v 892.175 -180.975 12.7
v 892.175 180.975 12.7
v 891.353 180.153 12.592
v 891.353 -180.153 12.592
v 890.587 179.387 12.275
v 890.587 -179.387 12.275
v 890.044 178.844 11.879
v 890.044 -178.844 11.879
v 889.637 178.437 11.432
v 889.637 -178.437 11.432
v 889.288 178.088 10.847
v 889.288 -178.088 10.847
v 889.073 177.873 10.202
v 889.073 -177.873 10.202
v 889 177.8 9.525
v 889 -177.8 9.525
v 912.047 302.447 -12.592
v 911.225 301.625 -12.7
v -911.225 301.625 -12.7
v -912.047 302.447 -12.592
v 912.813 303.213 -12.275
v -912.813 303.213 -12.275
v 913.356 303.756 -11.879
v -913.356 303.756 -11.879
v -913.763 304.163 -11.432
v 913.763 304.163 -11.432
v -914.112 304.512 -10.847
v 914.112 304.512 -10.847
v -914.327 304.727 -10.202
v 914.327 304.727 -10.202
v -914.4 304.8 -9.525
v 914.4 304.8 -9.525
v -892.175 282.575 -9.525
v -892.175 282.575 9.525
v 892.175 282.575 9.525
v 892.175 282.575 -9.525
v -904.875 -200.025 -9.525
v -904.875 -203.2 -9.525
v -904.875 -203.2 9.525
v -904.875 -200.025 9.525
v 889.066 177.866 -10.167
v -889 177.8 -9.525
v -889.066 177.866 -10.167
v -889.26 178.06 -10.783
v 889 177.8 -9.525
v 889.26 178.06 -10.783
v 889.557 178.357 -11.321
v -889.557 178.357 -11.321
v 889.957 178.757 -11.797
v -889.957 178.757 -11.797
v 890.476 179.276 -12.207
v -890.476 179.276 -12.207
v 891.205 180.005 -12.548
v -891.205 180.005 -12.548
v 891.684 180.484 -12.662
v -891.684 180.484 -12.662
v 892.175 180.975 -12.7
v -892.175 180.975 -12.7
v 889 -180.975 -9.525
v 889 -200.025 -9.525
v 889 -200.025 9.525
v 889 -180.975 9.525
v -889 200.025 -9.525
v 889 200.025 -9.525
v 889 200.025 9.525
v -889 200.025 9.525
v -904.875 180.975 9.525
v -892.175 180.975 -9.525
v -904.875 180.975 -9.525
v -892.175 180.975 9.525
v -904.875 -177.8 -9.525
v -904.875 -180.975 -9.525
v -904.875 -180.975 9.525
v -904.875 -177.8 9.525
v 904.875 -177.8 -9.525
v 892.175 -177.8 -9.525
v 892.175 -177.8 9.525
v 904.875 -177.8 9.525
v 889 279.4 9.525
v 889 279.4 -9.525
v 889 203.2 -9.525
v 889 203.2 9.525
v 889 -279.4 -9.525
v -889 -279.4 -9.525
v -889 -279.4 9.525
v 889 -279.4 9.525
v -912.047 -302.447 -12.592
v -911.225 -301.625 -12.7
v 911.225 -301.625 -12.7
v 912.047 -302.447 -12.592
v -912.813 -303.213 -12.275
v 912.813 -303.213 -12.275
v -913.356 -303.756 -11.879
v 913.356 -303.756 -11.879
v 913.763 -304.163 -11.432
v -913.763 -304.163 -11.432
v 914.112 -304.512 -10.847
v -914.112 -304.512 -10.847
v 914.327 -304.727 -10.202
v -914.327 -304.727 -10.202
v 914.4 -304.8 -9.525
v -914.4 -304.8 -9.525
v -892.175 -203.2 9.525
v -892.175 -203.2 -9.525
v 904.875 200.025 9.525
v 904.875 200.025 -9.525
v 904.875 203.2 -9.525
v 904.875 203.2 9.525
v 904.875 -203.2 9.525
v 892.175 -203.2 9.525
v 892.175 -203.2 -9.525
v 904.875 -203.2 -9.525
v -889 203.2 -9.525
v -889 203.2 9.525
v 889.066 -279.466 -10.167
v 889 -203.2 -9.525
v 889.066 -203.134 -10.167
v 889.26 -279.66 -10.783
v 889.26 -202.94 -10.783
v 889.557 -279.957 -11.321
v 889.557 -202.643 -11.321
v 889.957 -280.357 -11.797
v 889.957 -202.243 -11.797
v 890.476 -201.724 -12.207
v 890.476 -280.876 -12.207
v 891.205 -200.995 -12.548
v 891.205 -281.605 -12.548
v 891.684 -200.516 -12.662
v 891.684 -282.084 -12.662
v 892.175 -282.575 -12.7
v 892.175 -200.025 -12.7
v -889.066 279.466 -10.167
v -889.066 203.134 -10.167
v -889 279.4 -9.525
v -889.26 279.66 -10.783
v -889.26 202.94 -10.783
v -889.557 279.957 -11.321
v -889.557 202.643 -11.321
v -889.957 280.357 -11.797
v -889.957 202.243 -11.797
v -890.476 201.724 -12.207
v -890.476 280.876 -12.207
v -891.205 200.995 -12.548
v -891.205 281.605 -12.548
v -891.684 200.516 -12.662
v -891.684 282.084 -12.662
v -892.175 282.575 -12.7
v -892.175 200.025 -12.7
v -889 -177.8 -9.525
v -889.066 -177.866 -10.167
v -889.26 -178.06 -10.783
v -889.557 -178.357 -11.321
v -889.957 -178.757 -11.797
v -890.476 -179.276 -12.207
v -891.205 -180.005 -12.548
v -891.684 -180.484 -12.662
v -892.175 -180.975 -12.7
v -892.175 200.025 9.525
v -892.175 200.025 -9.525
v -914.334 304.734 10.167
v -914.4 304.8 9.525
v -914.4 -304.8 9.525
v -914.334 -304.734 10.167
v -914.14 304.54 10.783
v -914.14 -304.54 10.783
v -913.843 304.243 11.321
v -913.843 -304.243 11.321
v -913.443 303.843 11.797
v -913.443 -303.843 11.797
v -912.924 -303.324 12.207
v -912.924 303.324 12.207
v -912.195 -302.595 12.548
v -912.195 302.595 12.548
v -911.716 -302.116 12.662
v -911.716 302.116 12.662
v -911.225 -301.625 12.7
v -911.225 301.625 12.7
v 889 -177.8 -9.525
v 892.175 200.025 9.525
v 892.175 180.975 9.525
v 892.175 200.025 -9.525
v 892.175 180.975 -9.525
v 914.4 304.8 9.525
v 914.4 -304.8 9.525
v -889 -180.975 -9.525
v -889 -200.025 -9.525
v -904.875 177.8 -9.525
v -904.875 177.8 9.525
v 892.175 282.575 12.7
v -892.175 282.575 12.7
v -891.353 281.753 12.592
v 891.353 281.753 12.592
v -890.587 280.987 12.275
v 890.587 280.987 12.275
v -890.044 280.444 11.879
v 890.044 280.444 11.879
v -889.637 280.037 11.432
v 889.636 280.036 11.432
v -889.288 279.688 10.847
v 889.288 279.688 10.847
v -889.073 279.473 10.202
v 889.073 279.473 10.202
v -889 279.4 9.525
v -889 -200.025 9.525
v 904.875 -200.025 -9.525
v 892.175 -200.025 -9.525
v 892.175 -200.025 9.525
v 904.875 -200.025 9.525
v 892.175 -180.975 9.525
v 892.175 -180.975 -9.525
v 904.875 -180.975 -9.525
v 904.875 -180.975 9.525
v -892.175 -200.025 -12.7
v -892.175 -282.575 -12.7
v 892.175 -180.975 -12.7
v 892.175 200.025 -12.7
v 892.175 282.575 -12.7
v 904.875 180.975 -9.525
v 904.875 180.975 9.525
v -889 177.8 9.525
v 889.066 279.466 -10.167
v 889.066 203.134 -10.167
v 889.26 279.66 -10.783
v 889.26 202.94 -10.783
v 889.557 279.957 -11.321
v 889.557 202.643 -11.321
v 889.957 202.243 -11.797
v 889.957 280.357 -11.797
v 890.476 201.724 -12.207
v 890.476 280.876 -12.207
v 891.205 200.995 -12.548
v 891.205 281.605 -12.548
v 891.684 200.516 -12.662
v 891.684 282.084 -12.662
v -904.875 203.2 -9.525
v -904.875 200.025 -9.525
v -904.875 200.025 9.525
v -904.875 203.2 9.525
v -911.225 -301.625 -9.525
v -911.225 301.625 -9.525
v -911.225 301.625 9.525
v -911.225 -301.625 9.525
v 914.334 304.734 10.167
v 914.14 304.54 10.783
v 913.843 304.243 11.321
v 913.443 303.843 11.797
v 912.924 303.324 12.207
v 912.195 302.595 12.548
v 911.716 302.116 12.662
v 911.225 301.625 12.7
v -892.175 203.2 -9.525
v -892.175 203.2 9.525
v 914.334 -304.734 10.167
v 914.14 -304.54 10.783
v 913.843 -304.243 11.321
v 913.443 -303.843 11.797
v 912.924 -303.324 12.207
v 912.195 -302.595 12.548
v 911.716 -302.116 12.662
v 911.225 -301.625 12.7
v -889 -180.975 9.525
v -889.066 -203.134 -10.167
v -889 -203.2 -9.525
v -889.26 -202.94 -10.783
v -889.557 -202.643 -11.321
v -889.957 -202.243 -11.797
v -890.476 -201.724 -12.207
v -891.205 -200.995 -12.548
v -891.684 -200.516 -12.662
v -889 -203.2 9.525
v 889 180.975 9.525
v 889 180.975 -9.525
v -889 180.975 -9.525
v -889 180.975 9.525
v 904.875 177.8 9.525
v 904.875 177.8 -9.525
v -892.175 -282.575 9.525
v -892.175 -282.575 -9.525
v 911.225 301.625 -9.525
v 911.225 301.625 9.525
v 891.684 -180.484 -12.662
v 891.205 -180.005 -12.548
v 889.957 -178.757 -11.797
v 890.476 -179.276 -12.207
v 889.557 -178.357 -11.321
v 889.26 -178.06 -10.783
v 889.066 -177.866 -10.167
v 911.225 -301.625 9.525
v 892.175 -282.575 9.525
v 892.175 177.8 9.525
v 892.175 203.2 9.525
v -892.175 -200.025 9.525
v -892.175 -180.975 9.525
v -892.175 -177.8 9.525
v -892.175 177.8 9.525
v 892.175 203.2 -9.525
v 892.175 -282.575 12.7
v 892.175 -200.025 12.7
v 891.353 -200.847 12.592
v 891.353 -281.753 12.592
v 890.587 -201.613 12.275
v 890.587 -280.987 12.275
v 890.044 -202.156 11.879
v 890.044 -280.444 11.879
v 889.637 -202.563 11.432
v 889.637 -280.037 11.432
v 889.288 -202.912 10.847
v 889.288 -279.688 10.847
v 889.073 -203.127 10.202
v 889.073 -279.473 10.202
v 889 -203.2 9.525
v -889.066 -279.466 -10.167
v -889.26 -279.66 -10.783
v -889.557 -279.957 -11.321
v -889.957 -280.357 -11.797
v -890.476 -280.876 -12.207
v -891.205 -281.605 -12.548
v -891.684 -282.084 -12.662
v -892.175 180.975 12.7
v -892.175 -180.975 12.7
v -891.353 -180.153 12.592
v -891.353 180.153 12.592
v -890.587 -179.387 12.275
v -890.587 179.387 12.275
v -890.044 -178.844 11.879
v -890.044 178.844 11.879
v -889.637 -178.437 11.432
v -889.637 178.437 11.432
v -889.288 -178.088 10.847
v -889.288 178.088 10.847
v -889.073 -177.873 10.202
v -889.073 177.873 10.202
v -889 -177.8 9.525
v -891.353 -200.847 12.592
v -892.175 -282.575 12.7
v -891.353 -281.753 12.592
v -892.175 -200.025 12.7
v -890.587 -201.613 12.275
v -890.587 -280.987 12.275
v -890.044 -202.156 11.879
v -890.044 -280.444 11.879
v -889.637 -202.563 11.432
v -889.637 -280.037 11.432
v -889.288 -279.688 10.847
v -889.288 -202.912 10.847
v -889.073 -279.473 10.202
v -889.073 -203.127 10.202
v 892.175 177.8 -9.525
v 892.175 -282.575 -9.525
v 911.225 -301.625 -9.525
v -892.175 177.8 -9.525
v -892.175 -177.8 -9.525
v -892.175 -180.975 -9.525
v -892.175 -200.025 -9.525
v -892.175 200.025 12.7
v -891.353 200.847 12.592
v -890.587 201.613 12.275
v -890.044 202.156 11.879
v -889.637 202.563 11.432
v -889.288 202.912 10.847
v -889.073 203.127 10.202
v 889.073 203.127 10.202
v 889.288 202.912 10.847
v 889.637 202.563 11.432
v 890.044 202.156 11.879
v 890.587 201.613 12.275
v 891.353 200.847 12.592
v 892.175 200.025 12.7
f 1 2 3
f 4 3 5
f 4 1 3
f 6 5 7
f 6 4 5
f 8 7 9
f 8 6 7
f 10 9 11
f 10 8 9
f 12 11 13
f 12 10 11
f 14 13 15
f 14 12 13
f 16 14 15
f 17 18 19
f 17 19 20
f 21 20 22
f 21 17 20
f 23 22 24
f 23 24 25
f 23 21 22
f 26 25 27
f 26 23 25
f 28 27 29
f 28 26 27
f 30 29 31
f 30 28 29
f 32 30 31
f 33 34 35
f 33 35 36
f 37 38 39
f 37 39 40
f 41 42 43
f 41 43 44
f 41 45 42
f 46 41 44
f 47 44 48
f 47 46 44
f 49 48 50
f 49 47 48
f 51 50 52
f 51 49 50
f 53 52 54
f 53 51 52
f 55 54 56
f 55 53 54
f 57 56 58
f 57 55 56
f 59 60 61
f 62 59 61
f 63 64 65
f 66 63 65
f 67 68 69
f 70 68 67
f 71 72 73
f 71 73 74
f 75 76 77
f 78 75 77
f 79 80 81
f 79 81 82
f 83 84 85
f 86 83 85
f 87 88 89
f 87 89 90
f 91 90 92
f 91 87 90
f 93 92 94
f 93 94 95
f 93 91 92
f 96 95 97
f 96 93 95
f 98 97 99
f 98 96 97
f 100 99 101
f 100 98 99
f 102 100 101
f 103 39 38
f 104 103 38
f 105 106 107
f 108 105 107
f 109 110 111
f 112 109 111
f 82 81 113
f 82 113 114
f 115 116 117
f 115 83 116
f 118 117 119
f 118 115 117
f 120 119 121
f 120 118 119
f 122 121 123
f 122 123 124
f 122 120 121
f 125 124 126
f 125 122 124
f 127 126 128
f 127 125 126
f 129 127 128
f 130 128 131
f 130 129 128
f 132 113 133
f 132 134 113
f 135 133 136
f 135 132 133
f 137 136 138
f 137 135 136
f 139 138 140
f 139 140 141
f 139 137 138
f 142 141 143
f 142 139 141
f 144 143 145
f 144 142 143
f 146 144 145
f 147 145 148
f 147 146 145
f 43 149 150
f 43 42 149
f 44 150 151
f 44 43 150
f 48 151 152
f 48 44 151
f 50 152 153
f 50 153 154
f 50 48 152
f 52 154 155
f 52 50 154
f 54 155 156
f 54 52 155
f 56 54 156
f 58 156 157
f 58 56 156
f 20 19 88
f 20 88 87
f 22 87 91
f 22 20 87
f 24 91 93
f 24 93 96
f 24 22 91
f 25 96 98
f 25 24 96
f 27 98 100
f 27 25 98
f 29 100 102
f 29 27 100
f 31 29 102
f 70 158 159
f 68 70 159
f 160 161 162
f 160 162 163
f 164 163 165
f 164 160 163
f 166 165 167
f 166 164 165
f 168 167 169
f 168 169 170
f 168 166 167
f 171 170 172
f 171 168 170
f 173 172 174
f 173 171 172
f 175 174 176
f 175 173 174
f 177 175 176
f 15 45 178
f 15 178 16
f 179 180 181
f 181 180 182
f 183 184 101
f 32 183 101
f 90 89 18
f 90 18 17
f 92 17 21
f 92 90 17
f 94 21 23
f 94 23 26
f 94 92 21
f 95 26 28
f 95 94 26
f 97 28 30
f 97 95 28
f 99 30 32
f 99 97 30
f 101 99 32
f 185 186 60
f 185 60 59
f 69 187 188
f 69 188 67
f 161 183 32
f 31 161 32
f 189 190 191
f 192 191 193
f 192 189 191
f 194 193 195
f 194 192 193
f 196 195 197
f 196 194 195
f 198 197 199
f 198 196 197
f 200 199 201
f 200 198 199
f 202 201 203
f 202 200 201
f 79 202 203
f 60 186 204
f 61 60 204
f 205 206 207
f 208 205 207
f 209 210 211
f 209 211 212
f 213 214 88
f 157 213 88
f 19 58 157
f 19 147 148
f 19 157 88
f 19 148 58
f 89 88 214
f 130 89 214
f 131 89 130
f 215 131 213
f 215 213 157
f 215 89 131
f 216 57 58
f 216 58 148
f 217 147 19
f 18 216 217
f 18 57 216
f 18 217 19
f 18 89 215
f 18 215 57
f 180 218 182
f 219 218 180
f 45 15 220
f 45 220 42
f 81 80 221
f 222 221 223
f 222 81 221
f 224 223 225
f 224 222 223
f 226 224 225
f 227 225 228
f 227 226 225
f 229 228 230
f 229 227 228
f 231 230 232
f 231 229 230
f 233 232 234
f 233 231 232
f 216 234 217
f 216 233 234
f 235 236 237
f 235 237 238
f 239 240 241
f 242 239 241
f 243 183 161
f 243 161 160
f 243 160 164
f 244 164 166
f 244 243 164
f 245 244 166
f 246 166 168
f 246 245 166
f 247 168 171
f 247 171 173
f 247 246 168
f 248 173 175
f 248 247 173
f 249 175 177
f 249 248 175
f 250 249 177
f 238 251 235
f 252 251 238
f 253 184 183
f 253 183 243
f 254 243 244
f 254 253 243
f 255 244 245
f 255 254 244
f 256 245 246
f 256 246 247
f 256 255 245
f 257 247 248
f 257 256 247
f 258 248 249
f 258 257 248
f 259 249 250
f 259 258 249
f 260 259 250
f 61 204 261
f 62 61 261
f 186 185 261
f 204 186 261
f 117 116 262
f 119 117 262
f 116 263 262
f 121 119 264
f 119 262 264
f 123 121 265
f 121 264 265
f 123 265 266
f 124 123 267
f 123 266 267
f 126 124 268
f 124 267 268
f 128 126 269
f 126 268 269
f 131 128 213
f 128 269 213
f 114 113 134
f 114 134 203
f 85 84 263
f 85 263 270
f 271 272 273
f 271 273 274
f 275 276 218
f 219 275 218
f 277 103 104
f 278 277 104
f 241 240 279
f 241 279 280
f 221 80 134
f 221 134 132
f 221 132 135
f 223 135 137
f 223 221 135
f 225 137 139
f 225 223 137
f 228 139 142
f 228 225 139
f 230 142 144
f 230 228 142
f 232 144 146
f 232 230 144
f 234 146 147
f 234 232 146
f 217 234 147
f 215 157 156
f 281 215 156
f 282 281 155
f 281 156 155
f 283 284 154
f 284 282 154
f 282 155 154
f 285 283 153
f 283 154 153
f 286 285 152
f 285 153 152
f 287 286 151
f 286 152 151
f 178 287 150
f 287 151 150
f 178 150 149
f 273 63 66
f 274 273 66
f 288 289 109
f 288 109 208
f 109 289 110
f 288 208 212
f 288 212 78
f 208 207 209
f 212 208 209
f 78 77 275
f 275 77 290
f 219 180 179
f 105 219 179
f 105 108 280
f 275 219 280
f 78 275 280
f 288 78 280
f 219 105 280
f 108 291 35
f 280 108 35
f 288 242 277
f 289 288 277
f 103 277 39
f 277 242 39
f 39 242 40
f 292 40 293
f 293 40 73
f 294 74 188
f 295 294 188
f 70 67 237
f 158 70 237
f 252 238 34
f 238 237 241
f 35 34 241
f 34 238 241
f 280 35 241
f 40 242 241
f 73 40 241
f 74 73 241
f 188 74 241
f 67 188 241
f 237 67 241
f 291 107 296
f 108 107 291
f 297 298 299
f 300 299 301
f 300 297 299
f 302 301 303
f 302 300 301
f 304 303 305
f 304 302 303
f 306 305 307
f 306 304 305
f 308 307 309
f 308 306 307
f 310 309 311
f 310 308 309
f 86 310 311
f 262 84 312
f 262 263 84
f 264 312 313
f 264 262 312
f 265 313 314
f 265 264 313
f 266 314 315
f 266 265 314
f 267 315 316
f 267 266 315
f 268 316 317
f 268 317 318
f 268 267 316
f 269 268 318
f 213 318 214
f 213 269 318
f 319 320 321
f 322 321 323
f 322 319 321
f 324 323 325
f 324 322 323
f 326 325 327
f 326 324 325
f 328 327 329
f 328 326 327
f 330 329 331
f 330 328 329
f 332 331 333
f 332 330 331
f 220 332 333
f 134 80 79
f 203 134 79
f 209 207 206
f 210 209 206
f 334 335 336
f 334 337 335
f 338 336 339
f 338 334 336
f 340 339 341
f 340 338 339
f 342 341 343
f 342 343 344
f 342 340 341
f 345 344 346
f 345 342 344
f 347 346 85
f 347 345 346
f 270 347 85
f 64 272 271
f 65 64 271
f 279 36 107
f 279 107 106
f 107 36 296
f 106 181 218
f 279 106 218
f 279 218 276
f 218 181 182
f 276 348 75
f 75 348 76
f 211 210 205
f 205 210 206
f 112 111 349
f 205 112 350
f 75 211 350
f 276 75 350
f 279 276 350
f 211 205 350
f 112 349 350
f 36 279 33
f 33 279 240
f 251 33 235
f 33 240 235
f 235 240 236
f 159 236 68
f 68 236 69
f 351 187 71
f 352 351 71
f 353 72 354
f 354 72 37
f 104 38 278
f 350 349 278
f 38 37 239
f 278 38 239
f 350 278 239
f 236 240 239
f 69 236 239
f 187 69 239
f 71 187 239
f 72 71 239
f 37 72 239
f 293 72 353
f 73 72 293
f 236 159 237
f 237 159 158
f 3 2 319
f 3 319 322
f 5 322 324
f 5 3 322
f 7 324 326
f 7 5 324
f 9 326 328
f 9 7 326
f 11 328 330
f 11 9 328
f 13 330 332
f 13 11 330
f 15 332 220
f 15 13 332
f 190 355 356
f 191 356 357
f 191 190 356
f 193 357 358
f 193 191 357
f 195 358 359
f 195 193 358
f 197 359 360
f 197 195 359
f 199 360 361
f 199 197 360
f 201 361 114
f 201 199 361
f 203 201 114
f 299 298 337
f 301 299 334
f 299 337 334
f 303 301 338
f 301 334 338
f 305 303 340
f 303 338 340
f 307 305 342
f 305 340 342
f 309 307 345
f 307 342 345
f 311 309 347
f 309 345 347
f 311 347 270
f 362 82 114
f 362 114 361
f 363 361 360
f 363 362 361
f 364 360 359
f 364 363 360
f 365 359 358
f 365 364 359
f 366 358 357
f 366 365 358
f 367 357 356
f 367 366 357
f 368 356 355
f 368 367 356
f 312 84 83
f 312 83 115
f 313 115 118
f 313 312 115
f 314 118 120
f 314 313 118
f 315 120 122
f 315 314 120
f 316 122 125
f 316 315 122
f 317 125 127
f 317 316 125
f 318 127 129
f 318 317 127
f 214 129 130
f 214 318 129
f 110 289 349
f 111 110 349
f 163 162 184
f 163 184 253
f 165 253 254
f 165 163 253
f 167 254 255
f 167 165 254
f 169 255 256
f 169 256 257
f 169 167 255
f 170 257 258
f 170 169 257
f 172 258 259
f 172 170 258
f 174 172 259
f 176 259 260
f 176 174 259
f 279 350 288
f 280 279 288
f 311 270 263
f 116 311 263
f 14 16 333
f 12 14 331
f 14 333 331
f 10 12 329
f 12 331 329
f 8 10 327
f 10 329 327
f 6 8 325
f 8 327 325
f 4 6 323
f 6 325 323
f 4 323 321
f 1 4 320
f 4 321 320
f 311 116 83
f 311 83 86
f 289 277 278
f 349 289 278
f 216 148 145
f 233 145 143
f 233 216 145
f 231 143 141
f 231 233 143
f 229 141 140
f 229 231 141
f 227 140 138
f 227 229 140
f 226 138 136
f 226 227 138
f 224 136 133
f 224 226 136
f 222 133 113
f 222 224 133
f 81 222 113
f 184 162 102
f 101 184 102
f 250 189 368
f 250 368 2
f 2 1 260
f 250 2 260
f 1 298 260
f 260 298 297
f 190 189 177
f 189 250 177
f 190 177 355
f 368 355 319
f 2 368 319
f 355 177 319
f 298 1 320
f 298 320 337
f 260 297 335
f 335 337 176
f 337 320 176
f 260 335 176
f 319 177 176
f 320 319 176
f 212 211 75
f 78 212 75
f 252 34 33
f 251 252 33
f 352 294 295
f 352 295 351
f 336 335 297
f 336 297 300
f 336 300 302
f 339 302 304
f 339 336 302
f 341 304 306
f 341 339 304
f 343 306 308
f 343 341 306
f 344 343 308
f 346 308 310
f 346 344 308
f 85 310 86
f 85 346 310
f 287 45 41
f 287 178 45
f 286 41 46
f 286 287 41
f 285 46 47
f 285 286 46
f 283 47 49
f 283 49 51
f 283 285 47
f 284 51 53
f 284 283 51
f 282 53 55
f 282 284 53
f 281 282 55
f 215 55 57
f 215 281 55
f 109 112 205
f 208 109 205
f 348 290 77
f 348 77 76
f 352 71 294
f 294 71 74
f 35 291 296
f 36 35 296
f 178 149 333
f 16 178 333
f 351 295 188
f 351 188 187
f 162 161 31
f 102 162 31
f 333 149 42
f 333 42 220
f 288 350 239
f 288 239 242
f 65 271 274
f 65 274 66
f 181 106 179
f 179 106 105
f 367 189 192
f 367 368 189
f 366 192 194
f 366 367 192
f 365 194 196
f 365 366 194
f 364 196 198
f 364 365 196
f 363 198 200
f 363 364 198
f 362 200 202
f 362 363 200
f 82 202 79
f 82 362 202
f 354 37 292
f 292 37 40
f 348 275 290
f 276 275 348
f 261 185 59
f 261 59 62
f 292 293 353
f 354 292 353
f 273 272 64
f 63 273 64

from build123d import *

# Parameters (mm, degrees)
F0_W     = 19.05
F0_H     = 19.05
F3_W     = 19.05
F3_H     = 19.05
F4_DEPTH = 904.875


with BuildPart() as f2:
    # F2: sweep along a path in F1
    with BuildLine(Plane.XY) as f2_path:
        Line((914.4, -304.8), (-914.4, -304.8))
        Line((-914.4, -304.8), (-914.4, 304.8))
        Line((-914.4, 304.8), (914.4, 304.8))
        Line((914.4, 304.8), (914.4, -304.8))
    # F0 (on Right) → F2 (sweep)
    with BuildSketch(Plane.YZ):
        with BuildLine():
            Line((-282.575, 12.7), (-301.625, 12.7))
            ThreePointArc((-301.625, 12.7), (-303.8700640303, 11.7700640303), (-304.8, 9.525))
            Line((-304.8, 9.525), (-304.8, -9.525))
            ThreePointArc((-304.8, -9.525), (-303.8700640303, -11.7700640303), (-301.625, -12.7))
            Line((-301.625, -12.7), (-282.575, -12.7))
            ThreePointArc((-282.575, -12.7), (-280.3299359697, -11.7700640303), (-279.4, -9.525))
            Line((-279.4, -9.525), (-279.4, 9.525))
            ThreePointArc((-279.4, 9.525), (-280.3299359697, 11.7700640303), (-282.575, 12.7))
        make_face()
        with Locations((-292.1, 0)):
            Rectangle(F0_W, F0_H, mode=Mode.SUBTRACT)
    sweep(path=f2_path.line, transition=Transition.RIGHT)

    # F3 (on Right) → F4 (join, symmetric)
    with BuildSketch(Plane.YZ):
        with BuildLine():
            Line((-180.975, 12.7), (-200.025, 12.7))
            ThreePointArc((-200.025, 12.7), (-202.2700640303, 11.7700640303), (-203.2, 9.525))
            Line((-203.2, 9.525), (-203.2, -9.525))
            ThreePointArc((-203.2, -9.525), (-202.2700640303, -11.7700640303), (-200.025, -12.7))
            Line((-200.025, -12.7), (-180.975, -12.7))
            ThreePointArc((-180.975, -12.7), (-178.7299359697, -11.7700640303), (-177.8, -9.525))
            Line((-177.8, -9.525), (-177.8, 9.525))
            ThreePointArc((-177.8, 9.525), (-178.7299359697, 11.7700640303), (-180.975, 12.7))
        make_face()
        with Locations((-190.5, 0)):
            Rectangle(F3_W, F3_H, mode=Mode.SUBTRACT)
        with BuildLine():
            ThreePointArc((200.025, -12.7), (202.2700640303, -11.7700640303), (203.2, -9.525))
            Line((203.2, -9.525), (203.2, 9.525))
            ThreePointArc((203.2, 9.525), (202.2700640303, 11.7700640303), (200.025, 12.7))
            Line((200.025, 12.7), (180.975, 12.7))
            ThreePointArc((180.975, 12.7), (178.7299359697, 11.7700640303), (177.8, 9.525))
            Line((177.8, 9.525), (177.8, -9.525))
            ThreePointArc((177.8, -9.525), (178.7299359697, -11.7700640303), (180.975, -12.7))
            Line((180.975, -12.7), (200.025, -12.7))
        make_face()
        with Locations((190.5, 0)):
            Rectangle(F3_W, F3_H, mode=Mode.SUBTRACT)
    extrude(amount=F4_DEPTH, both=True)


solid = f2.part
